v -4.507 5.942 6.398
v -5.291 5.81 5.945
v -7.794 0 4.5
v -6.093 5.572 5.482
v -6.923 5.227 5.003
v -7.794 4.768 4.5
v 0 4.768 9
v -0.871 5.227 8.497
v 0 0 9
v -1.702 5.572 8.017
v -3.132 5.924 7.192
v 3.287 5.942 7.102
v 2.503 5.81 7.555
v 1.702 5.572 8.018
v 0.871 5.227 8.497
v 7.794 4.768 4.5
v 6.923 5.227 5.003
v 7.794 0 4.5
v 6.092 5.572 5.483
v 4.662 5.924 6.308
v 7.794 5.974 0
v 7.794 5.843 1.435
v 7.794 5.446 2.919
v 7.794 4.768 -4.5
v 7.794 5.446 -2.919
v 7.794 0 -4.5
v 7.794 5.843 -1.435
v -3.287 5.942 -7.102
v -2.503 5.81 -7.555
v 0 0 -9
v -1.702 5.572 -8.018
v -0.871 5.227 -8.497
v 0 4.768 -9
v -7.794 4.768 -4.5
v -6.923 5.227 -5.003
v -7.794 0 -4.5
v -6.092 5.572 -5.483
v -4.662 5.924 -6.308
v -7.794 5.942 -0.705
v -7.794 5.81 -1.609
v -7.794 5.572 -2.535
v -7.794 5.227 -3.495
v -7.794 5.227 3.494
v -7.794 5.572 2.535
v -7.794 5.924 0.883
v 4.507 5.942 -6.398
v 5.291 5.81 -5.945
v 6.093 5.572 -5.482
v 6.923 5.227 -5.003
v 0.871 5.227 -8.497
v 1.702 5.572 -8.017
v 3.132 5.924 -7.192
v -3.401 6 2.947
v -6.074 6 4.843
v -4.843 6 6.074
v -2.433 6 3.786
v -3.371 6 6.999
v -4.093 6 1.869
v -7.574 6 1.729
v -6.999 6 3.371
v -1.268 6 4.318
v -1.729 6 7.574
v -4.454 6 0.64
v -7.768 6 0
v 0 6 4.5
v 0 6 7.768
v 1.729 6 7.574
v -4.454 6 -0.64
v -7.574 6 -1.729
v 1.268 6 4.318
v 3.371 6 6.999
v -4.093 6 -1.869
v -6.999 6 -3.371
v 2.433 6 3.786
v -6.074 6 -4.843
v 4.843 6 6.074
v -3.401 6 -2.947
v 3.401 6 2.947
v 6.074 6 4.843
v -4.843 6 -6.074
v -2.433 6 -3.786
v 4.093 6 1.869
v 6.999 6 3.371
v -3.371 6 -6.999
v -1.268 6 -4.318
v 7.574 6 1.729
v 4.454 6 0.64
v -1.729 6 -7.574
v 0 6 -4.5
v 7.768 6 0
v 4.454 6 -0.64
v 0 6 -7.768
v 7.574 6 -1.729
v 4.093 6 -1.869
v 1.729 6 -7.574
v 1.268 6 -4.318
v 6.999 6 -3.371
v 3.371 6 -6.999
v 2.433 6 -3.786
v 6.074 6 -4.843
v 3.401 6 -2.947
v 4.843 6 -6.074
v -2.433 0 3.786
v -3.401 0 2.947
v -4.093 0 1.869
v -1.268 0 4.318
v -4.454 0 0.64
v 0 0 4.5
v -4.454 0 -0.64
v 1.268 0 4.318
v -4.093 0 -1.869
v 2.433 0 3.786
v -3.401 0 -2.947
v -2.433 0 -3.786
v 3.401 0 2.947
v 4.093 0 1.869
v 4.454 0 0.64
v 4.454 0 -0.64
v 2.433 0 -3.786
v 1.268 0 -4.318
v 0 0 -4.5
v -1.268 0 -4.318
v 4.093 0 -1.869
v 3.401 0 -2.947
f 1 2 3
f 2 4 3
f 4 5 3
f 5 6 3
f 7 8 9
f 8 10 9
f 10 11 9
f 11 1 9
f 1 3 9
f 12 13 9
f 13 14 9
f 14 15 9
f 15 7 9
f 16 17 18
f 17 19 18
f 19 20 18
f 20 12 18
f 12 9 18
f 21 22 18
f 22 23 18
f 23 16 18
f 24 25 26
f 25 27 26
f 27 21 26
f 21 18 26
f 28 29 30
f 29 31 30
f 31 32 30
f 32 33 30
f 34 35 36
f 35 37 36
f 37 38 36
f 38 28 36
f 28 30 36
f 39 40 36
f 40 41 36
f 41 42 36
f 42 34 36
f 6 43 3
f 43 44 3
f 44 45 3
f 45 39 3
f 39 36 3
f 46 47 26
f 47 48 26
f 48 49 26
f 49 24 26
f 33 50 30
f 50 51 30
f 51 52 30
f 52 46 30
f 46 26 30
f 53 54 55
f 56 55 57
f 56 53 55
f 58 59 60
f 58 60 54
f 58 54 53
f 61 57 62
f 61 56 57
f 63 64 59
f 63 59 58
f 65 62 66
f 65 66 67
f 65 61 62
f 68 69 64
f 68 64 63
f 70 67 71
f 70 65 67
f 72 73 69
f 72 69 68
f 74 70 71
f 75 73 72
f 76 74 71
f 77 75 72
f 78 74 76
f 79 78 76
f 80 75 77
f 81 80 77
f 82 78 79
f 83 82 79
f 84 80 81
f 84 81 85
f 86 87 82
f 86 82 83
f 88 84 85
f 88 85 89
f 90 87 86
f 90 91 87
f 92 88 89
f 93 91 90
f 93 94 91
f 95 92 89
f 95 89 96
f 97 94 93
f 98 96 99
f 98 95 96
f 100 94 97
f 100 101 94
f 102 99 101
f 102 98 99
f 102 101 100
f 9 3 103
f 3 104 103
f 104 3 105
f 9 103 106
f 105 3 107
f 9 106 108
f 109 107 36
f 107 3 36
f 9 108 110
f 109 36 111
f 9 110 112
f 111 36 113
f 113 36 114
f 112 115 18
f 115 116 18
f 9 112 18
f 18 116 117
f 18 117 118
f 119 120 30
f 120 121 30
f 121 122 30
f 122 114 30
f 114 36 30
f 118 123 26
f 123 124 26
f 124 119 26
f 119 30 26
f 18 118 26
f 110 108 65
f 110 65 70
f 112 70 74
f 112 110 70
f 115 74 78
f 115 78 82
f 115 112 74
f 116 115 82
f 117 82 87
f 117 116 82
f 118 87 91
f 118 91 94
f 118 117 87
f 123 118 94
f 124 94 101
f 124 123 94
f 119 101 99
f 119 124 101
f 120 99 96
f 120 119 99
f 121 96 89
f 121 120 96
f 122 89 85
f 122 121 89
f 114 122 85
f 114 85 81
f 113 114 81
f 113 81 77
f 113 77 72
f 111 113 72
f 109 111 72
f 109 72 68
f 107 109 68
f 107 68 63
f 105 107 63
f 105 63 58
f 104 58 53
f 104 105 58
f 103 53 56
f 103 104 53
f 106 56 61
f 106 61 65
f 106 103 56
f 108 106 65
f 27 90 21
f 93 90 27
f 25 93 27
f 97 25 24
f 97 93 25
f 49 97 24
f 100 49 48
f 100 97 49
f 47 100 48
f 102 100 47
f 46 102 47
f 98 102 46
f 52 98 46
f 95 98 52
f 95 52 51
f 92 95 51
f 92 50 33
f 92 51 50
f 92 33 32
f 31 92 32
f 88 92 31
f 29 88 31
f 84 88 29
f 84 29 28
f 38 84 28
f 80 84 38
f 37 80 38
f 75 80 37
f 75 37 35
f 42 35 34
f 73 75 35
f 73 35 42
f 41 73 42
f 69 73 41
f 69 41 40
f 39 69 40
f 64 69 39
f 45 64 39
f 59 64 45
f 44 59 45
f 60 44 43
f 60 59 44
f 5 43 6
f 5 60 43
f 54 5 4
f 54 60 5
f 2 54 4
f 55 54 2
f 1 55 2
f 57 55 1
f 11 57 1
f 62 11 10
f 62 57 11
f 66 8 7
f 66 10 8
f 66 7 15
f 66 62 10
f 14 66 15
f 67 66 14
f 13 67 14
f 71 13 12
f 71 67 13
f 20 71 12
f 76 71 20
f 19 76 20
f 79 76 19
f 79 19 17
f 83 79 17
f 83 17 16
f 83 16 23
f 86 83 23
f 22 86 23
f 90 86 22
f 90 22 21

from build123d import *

# Parameters (mm, degrees)
SKETCH3_R           = 4.5
BOSS_EXTRUDE2_DEPTH = 6
SKETCH4_OUTSIDE_W   = 42.5
SKETCH4_OUTSIDE_H   = 44.912
SKETCH4_OUTSIDE_R   = 7.768332991
CUT_EXTRUDE1_DEPTH  = 10
CUT_EXTRUDE1_DRAFT  = -45


with BuildPart() as part:
    # Sketch3 → Boss-Extrude2 (new body)
    with BuildSketch(Plane(origin=(0, 0, 0), x_dir=(1, 0, 0), z_dir=(0, 1, 0))):
        Polygon((0, -9), (7.794228634, -4.5), (7.794228634, 4.5), (0, 9), (-7.794228634, 4.5), (-7.794228634, -4.5), align=None)
        with Locations(Location((0, 0, 0), (0, 0, 270))):  # turned: the seam where the file's is
            Circle(SKETCH3_R, mode=Mode.SUBTRACT)
    extrude(amount=BOSS_EXTRUDE2_DEPTH)


with BuildPart() as cut_extrude1_tool:
    # Sketch4 outside → Cut-Extrude1 (with draft: the straight prism first)
    with BuildSketch(Plane(origin=(0, 6, 0), x_dir=(1, 0, 0), z_dir=(0, 1, 0))):
        Rectangle(SKETCH4_OUTSIDE_W, SKETCH4_OUTSIDE_H)
        Circle(SKETCH4_OUTSIDE_R, mode=Mode.SUBTRACT)
    extrude(amount=-CUT_EXTRUDE1_DEPTH)
    # Cut-Extrude1: the draft: its side faces are tilted about the plane it starts from
    cut_extrude1_sides = [cut_extrude1_tool.faces().sort_by_distance(p)[0] for p in [
        (0, 1, 22.456),
        (21.25, 1, 0),
        (0, 1, -22.456),
        (-21.25, 1, 0),
        (-7.768332991, 1, 0),
    ]]
    draft(cut_extrude1_sides, Plane(origin=(0, 6, 0), x_dir=(1, 0, 0), z_dir=(0, 1, 0)), CUT_EXTRUDE1_DRAFT)


with BuildPart() as part_1:
    add(part.part)

    # Cut-Extrude1: cut by cut_extrude1_tool
    add(cut_extrude1_tool.part, mode=Mode.SUBTRACT)


solid = part_1.part
